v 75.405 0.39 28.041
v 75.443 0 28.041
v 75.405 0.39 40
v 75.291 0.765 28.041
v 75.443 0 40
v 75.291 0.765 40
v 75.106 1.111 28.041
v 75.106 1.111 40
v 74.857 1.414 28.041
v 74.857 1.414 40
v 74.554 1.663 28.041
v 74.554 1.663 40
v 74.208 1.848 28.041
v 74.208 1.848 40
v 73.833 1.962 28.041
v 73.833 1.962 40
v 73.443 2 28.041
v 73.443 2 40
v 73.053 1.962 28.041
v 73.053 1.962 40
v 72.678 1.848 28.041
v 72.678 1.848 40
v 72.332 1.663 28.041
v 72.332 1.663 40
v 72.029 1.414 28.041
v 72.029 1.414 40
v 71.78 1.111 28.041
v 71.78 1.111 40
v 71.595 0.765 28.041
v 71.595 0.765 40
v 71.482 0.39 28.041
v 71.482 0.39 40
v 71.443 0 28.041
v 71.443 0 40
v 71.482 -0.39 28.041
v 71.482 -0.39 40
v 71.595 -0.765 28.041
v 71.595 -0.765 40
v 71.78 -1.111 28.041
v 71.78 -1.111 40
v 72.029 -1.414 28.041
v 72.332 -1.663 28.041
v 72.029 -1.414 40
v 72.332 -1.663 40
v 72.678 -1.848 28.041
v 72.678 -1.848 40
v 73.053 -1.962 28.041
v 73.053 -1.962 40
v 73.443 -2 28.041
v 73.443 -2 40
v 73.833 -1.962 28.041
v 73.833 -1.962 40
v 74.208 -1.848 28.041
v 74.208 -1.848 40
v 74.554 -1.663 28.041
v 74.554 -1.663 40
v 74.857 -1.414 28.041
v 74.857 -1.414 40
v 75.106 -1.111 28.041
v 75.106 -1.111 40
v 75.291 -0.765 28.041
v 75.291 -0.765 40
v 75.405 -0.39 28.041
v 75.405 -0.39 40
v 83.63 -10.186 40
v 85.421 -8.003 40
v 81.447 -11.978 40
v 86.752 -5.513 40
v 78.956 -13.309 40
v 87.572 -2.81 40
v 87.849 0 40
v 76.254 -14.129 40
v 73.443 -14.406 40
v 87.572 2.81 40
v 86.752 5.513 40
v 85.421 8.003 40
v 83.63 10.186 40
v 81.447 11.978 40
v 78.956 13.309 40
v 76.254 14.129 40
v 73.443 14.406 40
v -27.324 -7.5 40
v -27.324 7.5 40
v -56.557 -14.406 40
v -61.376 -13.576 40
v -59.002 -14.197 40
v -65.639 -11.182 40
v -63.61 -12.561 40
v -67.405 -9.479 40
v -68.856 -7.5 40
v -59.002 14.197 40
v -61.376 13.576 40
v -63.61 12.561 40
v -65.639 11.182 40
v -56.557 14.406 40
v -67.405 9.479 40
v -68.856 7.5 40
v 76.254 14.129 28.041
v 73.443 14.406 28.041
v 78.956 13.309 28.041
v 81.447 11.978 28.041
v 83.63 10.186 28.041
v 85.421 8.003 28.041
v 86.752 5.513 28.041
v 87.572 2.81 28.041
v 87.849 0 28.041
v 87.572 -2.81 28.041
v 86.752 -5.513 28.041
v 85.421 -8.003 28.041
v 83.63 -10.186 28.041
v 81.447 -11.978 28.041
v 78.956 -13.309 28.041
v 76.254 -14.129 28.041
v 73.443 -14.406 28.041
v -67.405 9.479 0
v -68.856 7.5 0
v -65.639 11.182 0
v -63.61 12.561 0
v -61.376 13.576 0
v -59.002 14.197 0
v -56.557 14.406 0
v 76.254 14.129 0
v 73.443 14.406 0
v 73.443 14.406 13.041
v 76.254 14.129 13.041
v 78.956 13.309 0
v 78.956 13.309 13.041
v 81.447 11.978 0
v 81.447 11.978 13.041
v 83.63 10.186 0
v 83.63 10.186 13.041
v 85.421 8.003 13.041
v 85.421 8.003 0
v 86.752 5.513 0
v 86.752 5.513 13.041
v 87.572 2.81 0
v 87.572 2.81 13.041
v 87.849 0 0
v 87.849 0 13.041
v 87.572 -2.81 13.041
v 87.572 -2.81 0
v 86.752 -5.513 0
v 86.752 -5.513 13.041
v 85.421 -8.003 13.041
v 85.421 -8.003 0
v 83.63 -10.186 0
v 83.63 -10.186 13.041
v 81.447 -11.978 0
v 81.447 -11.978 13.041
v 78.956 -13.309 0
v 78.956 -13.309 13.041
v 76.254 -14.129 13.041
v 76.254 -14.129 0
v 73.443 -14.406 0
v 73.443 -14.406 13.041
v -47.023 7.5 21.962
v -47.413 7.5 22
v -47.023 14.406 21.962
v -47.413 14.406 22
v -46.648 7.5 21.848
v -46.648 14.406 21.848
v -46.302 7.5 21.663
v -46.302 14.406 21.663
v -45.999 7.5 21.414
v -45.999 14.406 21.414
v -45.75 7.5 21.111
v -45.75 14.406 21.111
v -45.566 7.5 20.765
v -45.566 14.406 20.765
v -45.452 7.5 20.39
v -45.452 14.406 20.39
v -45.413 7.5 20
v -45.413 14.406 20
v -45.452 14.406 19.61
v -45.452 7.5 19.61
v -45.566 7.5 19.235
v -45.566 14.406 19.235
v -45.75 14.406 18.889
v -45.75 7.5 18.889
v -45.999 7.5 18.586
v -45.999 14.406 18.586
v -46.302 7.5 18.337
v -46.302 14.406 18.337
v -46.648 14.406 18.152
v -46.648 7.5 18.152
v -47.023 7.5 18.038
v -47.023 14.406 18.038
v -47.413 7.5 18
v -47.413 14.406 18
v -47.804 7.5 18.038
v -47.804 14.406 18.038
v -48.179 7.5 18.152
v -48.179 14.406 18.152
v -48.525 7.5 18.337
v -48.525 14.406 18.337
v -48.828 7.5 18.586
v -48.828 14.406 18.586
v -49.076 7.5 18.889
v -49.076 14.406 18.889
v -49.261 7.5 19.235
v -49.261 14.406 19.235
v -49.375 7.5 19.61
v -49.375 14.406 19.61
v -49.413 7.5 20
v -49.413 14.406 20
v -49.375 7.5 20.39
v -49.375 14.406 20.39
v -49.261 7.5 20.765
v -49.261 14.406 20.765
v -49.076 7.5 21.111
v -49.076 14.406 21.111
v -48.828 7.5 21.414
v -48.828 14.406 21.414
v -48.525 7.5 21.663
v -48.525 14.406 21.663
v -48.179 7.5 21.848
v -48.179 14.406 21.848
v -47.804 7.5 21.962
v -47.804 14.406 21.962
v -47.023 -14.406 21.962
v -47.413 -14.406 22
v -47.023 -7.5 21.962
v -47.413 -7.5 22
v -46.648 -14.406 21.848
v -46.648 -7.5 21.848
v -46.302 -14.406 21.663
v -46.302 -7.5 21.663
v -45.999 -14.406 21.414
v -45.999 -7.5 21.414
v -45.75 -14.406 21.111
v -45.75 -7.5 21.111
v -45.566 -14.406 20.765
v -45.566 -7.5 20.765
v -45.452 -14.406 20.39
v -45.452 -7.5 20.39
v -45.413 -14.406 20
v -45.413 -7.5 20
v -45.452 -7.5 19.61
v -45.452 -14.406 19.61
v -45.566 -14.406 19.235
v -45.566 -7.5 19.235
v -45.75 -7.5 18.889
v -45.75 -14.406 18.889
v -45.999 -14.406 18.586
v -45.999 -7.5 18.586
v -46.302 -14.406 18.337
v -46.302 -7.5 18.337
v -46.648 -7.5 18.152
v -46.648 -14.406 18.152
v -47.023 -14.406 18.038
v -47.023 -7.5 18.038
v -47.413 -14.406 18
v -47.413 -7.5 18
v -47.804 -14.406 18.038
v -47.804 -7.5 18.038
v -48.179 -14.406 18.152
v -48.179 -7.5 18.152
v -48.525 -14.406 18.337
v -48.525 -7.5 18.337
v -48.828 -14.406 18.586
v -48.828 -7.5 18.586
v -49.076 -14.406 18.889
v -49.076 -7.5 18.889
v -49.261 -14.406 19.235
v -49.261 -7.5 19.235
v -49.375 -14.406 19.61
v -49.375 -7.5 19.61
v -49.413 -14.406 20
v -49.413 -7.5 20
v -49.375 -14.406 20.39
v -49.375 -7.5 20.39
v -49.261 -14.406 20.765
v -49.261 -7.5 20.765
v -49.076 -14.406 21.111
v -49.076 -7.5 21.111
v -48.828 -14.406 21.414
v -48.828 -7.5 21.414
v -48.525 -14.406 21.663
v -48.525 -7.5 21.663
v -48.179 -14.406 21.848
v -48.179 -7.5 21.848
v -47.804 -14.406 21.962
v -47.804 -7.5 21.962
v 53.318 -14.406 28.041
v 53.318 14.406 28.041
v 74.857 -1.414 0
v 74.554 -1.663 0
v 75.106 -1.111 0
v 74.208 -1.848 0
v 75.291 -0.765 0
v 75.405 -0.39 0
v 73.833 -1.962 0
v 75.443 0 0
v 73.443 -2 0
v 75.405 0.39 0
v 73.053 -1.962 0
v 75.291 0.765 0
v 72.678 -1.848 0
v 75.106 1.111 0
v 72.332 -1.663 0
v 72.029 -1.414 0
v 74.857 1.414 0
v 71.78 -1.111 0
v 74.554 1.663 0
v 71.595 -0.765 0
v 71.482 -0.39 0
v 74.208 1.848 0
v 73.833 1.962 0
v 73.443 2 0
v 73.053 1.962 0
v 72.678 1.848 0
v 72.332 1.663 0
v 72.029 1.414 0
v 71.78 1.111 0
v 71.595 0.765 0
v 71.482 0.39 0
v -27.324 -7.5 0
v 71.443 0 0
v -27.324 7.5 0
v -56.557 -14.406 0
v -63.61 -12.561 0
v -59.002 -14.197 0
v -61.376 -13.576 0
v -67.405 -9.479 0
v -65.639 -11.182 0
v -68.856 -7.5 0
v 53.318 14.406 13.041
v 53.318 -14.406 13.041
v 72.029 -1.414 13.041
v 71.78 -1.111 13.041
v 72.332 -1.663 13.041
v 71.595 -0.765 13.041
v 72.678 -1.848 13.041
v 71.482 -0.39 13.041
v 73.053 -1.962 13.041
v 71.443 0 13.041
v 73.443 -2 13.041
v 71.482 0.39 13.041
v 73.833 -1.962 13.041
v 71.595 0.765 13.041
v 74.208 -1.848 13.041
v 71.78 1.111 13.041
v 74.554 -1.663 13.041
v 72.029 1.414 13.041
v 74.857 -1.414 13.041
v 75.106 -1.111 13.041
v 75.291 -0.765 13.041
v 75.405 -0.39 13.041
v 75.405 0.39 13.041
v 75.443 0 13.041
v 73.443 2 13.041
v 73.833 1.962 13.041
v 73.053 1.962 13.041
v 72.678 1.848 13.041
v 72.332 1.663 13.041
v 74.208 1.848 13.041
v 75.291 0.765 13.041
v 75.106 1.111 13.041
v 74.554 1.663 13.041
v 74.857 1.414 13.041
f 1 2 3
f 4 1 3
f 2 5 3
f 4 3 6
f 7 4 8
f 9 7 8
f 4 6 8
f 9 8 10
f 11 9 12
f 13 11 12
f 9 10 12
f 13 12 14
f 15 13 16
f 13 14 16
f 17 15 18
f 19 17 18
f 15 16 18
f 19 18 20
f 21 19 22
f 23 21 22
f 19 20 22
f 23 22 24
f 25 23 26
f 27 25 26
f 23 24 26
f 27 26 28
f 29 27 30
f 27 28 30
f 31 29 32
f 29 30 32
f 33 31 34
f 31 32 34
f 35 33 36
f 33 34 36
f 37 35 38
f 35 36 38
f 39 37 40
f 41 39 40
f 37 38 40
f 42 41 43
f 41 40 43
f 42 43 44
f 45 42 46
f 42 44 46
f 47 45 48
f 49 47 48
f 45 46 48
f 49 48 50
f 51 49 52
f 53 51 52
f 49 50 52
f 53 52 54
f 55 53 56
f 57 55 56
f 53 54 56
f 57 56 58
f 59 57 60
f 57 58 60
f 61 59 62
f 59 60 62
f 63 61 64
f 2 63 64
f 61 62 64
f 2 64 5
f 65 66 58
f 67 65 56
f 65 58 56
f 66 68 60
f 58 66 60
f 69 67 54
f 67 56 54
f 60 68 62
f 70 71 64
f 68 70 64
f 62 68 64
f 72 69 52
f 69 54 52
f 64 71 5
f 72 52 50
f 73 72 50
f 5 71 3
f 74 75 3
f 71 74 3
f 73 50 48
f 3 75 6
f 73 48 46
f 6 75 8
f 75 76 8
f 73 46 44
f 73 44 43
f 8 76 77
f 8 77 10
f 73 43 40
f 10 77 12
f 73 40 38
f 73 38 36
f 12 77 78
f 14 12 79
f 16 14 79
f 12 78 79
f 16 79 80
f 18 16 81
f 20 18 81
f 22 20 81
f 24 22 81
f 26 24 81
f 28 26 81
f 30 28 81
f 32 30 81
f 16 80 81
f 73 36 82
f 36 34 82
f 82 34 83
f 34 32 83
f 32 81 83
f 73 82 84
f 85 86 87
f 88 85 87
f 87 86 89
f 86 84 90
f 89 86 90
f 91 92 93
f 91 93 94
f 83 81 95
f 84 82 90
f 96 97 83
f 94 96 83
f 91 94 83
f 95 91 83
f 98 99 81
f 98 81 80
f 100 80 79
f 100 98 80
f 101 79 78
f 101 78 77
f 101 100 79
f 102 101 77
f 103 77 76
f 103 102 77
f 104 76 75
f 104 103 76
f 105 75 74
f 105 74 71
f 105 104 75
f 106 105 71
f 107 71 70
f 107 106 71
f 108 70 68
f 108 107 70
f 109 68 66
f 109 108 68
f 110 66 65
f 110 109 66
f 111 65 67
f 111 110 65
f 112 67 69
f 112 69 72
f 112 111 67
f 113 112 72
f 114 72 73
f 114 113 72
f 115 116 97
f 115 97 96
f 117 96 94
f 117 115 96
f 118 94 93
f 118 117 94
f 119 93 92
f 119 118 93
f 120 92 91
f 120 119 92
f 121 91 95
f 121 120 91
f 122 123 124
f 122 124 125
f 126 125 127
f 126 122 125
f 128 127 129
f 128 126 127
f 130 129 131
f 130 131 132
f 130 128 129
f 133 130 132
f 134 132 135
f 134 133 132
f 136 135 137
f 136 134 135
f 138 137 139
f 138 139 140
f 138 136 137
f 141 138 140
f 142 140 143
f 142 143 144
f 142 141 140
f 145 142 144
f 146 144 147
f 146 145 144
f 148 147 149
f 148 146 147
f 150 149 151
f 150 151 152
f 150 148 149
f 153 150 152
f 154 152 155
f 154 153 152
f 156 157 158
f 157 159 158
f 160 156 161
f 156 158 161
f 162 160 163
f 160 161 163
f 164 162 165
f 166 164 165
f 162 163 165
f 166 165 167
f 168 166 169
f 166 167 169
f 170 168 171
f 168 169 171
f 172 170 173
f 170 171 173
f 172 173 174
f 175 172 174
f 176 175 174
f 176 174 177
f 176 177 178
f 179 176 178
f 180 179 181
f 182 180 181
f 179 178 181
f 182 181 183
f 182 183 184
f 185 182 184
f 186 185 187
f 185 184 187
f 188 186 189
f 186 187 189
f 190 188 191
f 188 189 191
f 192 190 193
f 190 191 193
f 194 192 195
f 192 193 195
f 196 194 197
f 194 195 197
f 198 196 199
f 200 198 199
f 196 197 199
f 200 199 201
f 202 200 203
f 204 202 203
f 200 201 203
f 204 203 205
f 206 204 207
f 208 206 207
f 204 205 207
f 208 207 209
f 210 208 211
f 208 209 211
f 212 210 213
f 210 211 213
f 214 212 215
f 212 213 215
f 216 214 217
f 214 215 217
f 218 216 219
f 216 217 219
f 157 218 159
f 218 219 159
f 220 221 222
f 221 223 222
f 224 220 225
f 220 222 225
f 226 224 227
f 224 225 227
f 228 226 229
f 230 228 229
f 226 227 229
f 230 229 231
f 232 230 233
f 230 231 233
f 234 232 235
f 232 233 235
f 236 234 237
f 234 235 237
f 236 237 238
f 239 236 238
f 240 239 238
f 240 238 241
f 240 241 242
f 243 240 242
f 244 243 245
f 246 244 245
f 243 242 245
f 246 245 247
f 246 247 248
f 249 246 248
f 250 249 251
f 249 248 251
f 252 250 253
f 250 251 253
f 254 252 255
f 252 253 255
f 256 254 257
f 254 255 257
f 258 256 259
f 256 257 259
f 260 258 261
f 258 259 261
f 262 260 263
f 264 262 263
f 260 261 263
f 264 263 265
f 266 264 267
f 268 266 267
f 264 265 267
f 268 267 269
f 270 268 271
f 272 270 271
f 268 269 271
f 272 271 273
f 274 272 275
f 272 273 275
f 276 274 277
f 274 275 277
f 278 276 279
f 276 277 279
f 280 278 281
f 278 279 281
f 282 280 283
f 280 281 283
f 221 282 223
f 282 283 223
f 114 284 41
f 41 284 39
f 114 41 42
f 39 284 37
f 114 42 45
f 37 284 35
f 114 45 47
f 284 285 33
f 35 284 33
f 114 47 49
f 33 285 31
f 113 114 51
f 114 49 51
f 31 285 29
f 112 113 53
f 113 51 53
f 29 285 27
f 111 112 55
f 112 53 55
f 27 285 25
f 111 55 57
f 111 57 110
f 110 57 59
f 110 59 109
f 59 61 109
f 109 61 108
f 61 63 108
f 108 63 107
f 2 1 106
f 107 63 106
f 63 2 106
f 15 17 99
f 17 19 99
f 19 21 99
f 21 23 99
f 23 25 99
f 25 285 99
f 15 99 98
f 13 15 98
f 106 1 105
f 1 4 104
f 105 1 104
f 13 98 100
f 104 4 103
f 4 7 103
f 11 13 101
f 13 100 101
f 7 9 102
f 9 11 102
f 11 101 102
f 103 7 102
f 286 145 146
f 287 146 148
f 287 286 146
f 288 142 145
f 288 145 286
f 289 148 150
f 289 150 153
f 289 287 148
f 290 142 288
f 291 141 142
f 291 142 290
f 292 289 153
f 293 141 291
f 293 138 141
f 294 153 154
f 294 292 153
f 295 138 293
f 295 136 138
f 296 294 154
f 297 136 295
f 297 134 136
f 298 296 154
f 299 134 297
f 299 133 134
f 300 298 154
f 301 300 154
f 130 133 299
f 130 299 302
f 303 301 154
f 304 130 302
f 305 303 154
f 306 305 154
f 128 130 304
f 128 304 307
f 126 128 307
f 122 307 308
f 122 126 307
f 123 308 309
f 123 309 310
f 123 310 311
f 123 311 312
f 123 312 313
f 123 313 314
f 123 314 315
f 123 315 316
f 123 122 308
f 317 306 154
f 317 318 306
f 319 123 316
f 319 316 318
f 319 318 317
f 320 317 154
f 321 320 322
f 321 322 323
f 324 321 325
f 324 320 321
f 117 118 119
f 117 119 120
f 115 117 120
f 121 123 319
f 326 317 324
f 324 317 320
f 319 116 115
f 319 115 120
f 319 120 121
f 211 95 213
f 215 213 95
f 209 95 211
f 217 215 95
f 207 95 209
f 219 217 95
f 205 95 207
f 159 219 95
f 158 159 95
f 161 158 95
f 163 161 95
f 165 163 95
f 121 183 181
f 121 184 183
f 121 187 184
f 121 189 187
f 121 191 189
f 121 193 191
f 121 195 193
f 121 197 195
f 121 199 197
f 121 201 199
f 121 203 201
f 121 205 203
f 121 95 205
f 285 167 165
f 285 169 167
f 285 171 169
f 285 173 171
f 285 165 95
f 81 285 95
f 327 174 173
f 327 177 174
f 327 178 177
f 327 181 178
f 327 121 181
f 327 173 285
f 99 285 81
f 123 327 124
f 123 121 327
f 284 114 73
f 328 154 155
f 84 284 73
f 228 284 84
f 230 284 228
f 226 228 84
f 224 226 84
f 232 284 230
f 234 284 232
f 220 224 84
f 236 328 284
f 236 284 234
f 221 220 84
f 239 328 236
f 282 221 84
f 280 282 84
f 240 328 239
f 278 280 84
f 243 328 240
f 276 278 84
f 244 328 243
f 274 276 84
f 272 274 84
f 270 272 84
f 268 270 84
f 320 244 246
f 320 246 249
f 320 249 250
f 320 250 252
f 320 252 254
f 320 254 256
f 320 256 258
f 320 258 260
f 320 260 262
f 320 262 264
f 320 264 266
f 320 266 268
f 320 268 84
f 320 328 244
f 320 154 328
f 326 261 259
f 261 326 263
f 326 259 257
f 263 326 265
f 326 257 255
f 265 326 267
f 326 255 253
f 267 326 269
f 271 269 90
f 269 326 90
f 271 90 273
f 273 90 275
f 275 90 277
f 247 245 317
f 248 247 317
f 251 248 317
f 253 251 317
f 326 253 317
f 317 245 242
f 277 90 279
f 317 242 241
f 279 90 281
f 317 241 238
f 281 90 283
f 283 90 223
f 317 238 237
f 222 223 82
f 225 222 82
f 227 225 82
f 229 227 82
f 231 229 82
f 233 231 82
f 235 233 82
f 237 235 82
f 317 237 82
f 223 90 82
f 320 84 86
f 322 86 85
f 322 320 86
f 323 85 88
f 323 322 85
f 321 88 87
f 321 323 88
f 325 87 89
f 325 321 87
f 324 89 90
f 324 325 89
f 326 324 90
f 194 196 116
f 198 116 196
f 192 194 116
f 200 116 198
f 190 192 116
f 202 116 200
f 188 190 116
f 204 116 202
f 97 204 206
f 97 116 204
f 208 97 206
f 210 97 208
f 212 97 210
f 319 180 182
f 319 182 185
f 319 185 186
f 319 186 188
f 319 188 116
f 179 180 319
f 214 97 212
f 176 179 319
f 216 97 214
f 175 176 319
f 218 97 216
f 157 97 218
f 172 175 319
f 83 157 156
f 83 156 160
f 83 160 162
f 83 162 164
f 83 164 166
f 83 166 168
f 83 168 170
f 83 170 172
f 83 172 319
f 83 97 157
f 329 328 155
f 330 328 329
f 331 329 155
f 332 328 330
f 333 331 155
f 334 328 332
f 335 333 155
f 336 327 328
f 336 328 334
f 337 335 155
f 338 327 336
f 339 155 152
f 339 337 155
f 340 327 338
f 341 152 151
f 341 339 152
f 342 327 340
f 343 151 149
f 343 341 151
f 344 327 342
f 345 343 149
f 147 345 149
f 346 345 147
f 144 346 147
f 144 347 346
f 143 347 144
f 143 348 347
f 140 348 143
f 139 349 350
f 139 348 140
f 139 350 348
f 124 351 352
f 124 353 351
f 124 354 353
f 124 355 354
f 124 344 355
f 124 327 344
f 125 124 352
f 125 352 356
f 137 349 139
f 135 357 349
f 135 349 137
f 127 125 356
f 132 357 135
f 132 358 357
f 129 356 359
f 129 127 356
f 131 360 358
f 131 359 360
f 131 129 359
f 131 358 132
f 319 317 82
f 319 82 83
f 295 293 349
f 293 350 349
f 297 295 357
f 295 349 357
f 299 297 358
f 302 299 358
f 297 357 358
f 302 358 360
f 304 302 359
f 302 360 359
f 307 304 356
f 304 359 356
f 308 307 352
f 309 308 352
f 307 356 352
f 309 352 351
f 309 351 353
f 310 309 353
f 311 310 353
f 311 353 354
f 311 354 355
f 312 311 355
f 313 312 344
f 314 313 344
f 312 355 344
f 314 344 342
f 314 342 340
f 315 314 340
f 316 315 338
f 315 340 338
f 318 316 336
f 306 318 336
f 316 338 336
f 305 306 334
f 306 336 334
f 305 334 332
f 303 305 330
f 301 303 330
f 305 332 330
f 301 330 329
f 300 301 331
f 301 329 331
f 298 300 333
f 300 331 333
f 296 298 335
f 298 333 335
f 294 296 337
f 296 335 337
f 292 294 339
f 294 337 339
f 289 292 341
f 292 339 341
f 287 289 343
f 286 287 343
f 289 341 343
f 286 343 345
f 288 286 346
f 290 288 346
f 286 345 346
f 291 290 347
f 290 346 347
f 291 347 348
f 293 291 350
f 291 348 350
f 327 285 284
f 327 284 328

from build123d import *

# Parameters (mm, degrees)
RESSALTO_EXTRUS_O1_DEPTH = 40
ESBO_O2_R                = 2
CORTE_EXTRUS_O1_DEPTH    = 40
ESBO_O3_W                = 45.5934118
ESBO_O3_H                = 15
CORTE_EXTRUS_O2_DEPTH    = 40
ESBO_O4_R                = 2
CORTE_EXTRUS_O3_DEPTH    = 40
ESBO_O6_W                = 60.91322231
ESBO_O6_H                = 15
CORTE_EXTRUS_O5_DEPTH    = 62.5


with BuildPart() as part:
    # Esboço1 → Ressalto-extrusão1 (new body)
    with BuildSketch(Plane.XY):
        with BuildLine():
            Line((-56.556913458, 14.405805893), (73.443086542, 14.405805893))
            ThreePointArc((73.443086542, 14.405805893), (87.848892435, 0), (73.443086542, -14.405805893))
            Line((73.443086542, -14.405805893), (-56.556913458, -14.405805893))
            ThreePointArc((-56.556913458, -14.405805893), (-70.96271935, 0), (-56.556913458, 14.405805893))
        make_face()
    extrude(amount=RESSALTO_EXTRUS_O1_DEPTH)

    # Esboço2 → Corte-extrusão1 (cut, symmetric)
    with BuildSketch(Plane.XY.offset(40)):
        with Locations((73.443086542, 0)):
            Circle(ESBO_O2_R)
    extrude(amount=CORTE_EXTRUS_O1_DEPTH, both=True, mode=Mode.SUBTRACT)

    # Esboço3 → Corte-extrusão2 (cut, symmetric)
    with BuildSketch(Plane.XY.offset(40)):
        with Locations((-50.120588086, 0)):
            Rectangle(ESBO_O3_W, ESBO_O3_H)
    extrude(amount=CORTE_EXTRUS_O2_DEPTH, both=True, mode=Mode.SUBTRACT)

    # Esboço4 → Corte-extrusão3 (cut, symmetric)
    with BuildSketch(Plane(origin=(0, 14.405805893, 0), x_dir=(1, 0, 0), z_dir=(0, 1, 0))):
        with Locations(Location((-47.413412599, -20, 0), (0, 0, 270))):
            Circle(ESBO_O4_R)
    extrude(amount=CORTE_EXTRUS_O3_DEPTH, both=True, mode=Mode.SUBTRACT)

    # Esboço6 → Corte-extrusão5 (cut, symmetric)
    with BuildSketch(Plane(origin=(0, 14.405805893, 0), x_dir=(1, 0, 0), z_dir=(0, 1, 0))):
        with Locations((83.774809185, -20.540511229)):
            Rectangle(ESBO_O6_W, ESBO_O6_H)
    extrude(amount=CORTE_EXTRUS_O5_DEPTH, both=True, mode=Mode.SUBTRACT)


solid = part.part
